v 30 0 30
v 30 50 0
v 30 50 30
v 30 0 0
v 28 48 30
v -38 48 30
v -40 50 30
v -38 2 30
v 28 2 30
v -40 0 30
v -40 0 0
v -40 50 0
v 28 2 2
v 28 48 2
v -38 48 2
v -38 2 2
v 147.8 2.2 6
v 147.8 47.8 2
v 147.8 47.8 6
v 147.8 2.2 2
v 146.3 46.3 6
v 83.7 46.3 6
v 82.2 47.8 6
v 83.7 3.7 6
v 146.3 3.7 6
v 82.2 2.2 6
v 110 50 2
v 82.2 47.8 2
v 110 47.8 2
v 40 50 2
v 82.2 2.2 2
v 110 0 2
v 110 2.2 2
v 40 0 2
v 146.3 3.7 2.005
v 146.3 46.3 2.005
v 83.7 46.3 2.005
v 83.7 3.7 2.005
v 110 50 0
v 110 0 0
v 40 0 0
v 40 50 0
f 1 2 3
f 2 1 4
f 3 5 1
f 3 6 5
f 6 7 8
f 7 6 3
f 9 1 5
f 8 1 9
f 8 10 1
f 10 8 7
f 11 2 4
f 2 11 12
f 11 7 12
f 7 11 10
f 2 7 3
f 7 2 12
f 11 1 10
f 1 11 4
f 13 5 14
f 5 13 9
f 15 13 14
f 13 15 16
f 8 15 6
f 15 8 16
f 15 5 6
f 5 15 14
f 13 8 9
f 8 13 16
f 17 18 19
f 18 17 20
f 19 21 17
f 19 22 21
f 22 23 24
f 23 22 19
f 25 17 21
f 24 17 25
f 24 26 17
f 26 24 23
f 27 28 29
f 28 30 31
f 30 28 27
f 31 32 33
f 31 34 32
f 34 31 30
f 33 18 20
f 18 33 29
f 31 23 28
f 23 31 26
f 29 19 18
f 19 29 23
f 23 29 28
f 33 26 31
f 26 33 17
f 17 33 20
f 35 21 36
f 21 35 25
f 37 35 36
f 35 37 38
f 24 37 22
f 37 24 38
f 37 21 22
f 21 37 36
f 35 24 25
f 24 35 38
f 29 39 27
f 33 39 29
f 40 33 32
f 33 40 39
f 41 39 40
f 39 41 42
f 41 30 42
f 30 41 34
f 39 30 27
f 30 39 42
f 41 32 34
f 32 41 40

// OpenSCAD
$fn = 64;

// --- Box Dimensions ---
BOX_OUT_X = 70;   // Outer length (X)
BOX_OUT_Y = 50;   // Outer width (Y)
BOX_OUT_Z = 30;   // Outer height (Z)
WALL_THK  = 2;    // Wall thickness
FLOOR_THK = 2;    // Floor thickness
BOX_IN_X  = BOX_OUT_X - 2 * WALL_THK; // Inner length
BOX_IN_Y  = BOX_OUT_Y - 2 * WALL_THK; // Inner width
BOX_IN_Z  = BOX_OUT_Z - FLOOR_THK;    // Inner height

// --- Lid Dimensions ---
LID_PLATE_X = 70;   // Plate length (X)
LID_PLATE_Y = 50;   // Plate width (Y)
LID_PLATE_Z = 2;    // Plate thickness (Z)
LIP_OUT_X   = 65.6; // Lip outer length (X)
LIP_OUT_Y   = 45.6; // Lip outer width (Y)
LIP_THK     = 1.5;  // Lip wall thickness
LIP_H       = 4;    // Lip height
LIP_IN_X    = LIP_OUT_X - 2 * LIP_THK; // Lip inner length
LIP_IN_Y    = LIP_OUT_Y - 2 * LIP_THK; // Lip inner width

// --- Lid Lip Positioning ---
// Lid plate is at X: 40..110, Y: 0..50.
// Center of lid plate: X = 75, Y = 25.
// Lip should be centered on the lid plate.
LIP_CENTER_X = 40 + LID_PLATE_X / 2; // 75
LIP_CENTER_Y = 0  + LID_PLATE_Y / 2; // 25
LIP_HALF_X   = LIP_OUT_X / 2;        // 32.8
LIP_HALF_Y   = LIP_OUT_Y / 2;        // 22.8
LIP_IN_HALF_X = LIP_IN_X / 2;        // 31.3
LIP_IN_HALF_Y = LIP_IN_Y / 2;        // 21.3

LIP_OFFSET_X = LIP_CENTER_X - LIP_HALF_X;   // 42.2
LIP_OFFSET_Y = LIP_CENTER_Y - LIP_HALF_Y;   // 2.2
CUT_OFFSET_X = LIP_CENTER_X - LIP_IN_HALF_X; // 43.7
CUT_OFFSET_Y = LIP_CENTER_Y - LIP_IN_HALF_Y; // 3.7

// --- Part 1: Box ---
translate([-40, 0, 0]) {
    difference() {
        // Solid block before hollowing
        cube([BOX_OUT_X, BOX_OUT_Y, BOX_OUT_Z]);
        // Hollow cutout: leaves 2mm walls and floor. Extends 0.02mm past top face.
        translate([WALL_THK, WALL_THK, FLOOR_THK])
            cube([BOX_IN_X, BOX_IN_Y, BOX_IN_Z + 0.02]);
    }
}

// --- Part 2: Lid ---
translate([40, 0, 0]) {
    union() {
        // Base plate
        cube([LID_PLATE_X, LID_PLATE_Y, LID_PLATE_Z]);
        
        // Lip (hollow rectangle)
        difference() {
            // Outer lip block
            translate([LIP_OFFSET_X, LIP_OFFSET_Y, LID_PLATE_Z])
                cube([LIP_OUT_X, LIP_OUT_Y, LIP_H]);
            // Inner cutout: extends 0.02mm past the top face of the lip
            translate([CUT_OFFSET_X, CUT_OFFSET_Y, LID_PLATE_Z + 0.005])
                cube([LIP_IN_X, LIP_IN_Y, LIP_H + 0.02]);
        }
    }
}
